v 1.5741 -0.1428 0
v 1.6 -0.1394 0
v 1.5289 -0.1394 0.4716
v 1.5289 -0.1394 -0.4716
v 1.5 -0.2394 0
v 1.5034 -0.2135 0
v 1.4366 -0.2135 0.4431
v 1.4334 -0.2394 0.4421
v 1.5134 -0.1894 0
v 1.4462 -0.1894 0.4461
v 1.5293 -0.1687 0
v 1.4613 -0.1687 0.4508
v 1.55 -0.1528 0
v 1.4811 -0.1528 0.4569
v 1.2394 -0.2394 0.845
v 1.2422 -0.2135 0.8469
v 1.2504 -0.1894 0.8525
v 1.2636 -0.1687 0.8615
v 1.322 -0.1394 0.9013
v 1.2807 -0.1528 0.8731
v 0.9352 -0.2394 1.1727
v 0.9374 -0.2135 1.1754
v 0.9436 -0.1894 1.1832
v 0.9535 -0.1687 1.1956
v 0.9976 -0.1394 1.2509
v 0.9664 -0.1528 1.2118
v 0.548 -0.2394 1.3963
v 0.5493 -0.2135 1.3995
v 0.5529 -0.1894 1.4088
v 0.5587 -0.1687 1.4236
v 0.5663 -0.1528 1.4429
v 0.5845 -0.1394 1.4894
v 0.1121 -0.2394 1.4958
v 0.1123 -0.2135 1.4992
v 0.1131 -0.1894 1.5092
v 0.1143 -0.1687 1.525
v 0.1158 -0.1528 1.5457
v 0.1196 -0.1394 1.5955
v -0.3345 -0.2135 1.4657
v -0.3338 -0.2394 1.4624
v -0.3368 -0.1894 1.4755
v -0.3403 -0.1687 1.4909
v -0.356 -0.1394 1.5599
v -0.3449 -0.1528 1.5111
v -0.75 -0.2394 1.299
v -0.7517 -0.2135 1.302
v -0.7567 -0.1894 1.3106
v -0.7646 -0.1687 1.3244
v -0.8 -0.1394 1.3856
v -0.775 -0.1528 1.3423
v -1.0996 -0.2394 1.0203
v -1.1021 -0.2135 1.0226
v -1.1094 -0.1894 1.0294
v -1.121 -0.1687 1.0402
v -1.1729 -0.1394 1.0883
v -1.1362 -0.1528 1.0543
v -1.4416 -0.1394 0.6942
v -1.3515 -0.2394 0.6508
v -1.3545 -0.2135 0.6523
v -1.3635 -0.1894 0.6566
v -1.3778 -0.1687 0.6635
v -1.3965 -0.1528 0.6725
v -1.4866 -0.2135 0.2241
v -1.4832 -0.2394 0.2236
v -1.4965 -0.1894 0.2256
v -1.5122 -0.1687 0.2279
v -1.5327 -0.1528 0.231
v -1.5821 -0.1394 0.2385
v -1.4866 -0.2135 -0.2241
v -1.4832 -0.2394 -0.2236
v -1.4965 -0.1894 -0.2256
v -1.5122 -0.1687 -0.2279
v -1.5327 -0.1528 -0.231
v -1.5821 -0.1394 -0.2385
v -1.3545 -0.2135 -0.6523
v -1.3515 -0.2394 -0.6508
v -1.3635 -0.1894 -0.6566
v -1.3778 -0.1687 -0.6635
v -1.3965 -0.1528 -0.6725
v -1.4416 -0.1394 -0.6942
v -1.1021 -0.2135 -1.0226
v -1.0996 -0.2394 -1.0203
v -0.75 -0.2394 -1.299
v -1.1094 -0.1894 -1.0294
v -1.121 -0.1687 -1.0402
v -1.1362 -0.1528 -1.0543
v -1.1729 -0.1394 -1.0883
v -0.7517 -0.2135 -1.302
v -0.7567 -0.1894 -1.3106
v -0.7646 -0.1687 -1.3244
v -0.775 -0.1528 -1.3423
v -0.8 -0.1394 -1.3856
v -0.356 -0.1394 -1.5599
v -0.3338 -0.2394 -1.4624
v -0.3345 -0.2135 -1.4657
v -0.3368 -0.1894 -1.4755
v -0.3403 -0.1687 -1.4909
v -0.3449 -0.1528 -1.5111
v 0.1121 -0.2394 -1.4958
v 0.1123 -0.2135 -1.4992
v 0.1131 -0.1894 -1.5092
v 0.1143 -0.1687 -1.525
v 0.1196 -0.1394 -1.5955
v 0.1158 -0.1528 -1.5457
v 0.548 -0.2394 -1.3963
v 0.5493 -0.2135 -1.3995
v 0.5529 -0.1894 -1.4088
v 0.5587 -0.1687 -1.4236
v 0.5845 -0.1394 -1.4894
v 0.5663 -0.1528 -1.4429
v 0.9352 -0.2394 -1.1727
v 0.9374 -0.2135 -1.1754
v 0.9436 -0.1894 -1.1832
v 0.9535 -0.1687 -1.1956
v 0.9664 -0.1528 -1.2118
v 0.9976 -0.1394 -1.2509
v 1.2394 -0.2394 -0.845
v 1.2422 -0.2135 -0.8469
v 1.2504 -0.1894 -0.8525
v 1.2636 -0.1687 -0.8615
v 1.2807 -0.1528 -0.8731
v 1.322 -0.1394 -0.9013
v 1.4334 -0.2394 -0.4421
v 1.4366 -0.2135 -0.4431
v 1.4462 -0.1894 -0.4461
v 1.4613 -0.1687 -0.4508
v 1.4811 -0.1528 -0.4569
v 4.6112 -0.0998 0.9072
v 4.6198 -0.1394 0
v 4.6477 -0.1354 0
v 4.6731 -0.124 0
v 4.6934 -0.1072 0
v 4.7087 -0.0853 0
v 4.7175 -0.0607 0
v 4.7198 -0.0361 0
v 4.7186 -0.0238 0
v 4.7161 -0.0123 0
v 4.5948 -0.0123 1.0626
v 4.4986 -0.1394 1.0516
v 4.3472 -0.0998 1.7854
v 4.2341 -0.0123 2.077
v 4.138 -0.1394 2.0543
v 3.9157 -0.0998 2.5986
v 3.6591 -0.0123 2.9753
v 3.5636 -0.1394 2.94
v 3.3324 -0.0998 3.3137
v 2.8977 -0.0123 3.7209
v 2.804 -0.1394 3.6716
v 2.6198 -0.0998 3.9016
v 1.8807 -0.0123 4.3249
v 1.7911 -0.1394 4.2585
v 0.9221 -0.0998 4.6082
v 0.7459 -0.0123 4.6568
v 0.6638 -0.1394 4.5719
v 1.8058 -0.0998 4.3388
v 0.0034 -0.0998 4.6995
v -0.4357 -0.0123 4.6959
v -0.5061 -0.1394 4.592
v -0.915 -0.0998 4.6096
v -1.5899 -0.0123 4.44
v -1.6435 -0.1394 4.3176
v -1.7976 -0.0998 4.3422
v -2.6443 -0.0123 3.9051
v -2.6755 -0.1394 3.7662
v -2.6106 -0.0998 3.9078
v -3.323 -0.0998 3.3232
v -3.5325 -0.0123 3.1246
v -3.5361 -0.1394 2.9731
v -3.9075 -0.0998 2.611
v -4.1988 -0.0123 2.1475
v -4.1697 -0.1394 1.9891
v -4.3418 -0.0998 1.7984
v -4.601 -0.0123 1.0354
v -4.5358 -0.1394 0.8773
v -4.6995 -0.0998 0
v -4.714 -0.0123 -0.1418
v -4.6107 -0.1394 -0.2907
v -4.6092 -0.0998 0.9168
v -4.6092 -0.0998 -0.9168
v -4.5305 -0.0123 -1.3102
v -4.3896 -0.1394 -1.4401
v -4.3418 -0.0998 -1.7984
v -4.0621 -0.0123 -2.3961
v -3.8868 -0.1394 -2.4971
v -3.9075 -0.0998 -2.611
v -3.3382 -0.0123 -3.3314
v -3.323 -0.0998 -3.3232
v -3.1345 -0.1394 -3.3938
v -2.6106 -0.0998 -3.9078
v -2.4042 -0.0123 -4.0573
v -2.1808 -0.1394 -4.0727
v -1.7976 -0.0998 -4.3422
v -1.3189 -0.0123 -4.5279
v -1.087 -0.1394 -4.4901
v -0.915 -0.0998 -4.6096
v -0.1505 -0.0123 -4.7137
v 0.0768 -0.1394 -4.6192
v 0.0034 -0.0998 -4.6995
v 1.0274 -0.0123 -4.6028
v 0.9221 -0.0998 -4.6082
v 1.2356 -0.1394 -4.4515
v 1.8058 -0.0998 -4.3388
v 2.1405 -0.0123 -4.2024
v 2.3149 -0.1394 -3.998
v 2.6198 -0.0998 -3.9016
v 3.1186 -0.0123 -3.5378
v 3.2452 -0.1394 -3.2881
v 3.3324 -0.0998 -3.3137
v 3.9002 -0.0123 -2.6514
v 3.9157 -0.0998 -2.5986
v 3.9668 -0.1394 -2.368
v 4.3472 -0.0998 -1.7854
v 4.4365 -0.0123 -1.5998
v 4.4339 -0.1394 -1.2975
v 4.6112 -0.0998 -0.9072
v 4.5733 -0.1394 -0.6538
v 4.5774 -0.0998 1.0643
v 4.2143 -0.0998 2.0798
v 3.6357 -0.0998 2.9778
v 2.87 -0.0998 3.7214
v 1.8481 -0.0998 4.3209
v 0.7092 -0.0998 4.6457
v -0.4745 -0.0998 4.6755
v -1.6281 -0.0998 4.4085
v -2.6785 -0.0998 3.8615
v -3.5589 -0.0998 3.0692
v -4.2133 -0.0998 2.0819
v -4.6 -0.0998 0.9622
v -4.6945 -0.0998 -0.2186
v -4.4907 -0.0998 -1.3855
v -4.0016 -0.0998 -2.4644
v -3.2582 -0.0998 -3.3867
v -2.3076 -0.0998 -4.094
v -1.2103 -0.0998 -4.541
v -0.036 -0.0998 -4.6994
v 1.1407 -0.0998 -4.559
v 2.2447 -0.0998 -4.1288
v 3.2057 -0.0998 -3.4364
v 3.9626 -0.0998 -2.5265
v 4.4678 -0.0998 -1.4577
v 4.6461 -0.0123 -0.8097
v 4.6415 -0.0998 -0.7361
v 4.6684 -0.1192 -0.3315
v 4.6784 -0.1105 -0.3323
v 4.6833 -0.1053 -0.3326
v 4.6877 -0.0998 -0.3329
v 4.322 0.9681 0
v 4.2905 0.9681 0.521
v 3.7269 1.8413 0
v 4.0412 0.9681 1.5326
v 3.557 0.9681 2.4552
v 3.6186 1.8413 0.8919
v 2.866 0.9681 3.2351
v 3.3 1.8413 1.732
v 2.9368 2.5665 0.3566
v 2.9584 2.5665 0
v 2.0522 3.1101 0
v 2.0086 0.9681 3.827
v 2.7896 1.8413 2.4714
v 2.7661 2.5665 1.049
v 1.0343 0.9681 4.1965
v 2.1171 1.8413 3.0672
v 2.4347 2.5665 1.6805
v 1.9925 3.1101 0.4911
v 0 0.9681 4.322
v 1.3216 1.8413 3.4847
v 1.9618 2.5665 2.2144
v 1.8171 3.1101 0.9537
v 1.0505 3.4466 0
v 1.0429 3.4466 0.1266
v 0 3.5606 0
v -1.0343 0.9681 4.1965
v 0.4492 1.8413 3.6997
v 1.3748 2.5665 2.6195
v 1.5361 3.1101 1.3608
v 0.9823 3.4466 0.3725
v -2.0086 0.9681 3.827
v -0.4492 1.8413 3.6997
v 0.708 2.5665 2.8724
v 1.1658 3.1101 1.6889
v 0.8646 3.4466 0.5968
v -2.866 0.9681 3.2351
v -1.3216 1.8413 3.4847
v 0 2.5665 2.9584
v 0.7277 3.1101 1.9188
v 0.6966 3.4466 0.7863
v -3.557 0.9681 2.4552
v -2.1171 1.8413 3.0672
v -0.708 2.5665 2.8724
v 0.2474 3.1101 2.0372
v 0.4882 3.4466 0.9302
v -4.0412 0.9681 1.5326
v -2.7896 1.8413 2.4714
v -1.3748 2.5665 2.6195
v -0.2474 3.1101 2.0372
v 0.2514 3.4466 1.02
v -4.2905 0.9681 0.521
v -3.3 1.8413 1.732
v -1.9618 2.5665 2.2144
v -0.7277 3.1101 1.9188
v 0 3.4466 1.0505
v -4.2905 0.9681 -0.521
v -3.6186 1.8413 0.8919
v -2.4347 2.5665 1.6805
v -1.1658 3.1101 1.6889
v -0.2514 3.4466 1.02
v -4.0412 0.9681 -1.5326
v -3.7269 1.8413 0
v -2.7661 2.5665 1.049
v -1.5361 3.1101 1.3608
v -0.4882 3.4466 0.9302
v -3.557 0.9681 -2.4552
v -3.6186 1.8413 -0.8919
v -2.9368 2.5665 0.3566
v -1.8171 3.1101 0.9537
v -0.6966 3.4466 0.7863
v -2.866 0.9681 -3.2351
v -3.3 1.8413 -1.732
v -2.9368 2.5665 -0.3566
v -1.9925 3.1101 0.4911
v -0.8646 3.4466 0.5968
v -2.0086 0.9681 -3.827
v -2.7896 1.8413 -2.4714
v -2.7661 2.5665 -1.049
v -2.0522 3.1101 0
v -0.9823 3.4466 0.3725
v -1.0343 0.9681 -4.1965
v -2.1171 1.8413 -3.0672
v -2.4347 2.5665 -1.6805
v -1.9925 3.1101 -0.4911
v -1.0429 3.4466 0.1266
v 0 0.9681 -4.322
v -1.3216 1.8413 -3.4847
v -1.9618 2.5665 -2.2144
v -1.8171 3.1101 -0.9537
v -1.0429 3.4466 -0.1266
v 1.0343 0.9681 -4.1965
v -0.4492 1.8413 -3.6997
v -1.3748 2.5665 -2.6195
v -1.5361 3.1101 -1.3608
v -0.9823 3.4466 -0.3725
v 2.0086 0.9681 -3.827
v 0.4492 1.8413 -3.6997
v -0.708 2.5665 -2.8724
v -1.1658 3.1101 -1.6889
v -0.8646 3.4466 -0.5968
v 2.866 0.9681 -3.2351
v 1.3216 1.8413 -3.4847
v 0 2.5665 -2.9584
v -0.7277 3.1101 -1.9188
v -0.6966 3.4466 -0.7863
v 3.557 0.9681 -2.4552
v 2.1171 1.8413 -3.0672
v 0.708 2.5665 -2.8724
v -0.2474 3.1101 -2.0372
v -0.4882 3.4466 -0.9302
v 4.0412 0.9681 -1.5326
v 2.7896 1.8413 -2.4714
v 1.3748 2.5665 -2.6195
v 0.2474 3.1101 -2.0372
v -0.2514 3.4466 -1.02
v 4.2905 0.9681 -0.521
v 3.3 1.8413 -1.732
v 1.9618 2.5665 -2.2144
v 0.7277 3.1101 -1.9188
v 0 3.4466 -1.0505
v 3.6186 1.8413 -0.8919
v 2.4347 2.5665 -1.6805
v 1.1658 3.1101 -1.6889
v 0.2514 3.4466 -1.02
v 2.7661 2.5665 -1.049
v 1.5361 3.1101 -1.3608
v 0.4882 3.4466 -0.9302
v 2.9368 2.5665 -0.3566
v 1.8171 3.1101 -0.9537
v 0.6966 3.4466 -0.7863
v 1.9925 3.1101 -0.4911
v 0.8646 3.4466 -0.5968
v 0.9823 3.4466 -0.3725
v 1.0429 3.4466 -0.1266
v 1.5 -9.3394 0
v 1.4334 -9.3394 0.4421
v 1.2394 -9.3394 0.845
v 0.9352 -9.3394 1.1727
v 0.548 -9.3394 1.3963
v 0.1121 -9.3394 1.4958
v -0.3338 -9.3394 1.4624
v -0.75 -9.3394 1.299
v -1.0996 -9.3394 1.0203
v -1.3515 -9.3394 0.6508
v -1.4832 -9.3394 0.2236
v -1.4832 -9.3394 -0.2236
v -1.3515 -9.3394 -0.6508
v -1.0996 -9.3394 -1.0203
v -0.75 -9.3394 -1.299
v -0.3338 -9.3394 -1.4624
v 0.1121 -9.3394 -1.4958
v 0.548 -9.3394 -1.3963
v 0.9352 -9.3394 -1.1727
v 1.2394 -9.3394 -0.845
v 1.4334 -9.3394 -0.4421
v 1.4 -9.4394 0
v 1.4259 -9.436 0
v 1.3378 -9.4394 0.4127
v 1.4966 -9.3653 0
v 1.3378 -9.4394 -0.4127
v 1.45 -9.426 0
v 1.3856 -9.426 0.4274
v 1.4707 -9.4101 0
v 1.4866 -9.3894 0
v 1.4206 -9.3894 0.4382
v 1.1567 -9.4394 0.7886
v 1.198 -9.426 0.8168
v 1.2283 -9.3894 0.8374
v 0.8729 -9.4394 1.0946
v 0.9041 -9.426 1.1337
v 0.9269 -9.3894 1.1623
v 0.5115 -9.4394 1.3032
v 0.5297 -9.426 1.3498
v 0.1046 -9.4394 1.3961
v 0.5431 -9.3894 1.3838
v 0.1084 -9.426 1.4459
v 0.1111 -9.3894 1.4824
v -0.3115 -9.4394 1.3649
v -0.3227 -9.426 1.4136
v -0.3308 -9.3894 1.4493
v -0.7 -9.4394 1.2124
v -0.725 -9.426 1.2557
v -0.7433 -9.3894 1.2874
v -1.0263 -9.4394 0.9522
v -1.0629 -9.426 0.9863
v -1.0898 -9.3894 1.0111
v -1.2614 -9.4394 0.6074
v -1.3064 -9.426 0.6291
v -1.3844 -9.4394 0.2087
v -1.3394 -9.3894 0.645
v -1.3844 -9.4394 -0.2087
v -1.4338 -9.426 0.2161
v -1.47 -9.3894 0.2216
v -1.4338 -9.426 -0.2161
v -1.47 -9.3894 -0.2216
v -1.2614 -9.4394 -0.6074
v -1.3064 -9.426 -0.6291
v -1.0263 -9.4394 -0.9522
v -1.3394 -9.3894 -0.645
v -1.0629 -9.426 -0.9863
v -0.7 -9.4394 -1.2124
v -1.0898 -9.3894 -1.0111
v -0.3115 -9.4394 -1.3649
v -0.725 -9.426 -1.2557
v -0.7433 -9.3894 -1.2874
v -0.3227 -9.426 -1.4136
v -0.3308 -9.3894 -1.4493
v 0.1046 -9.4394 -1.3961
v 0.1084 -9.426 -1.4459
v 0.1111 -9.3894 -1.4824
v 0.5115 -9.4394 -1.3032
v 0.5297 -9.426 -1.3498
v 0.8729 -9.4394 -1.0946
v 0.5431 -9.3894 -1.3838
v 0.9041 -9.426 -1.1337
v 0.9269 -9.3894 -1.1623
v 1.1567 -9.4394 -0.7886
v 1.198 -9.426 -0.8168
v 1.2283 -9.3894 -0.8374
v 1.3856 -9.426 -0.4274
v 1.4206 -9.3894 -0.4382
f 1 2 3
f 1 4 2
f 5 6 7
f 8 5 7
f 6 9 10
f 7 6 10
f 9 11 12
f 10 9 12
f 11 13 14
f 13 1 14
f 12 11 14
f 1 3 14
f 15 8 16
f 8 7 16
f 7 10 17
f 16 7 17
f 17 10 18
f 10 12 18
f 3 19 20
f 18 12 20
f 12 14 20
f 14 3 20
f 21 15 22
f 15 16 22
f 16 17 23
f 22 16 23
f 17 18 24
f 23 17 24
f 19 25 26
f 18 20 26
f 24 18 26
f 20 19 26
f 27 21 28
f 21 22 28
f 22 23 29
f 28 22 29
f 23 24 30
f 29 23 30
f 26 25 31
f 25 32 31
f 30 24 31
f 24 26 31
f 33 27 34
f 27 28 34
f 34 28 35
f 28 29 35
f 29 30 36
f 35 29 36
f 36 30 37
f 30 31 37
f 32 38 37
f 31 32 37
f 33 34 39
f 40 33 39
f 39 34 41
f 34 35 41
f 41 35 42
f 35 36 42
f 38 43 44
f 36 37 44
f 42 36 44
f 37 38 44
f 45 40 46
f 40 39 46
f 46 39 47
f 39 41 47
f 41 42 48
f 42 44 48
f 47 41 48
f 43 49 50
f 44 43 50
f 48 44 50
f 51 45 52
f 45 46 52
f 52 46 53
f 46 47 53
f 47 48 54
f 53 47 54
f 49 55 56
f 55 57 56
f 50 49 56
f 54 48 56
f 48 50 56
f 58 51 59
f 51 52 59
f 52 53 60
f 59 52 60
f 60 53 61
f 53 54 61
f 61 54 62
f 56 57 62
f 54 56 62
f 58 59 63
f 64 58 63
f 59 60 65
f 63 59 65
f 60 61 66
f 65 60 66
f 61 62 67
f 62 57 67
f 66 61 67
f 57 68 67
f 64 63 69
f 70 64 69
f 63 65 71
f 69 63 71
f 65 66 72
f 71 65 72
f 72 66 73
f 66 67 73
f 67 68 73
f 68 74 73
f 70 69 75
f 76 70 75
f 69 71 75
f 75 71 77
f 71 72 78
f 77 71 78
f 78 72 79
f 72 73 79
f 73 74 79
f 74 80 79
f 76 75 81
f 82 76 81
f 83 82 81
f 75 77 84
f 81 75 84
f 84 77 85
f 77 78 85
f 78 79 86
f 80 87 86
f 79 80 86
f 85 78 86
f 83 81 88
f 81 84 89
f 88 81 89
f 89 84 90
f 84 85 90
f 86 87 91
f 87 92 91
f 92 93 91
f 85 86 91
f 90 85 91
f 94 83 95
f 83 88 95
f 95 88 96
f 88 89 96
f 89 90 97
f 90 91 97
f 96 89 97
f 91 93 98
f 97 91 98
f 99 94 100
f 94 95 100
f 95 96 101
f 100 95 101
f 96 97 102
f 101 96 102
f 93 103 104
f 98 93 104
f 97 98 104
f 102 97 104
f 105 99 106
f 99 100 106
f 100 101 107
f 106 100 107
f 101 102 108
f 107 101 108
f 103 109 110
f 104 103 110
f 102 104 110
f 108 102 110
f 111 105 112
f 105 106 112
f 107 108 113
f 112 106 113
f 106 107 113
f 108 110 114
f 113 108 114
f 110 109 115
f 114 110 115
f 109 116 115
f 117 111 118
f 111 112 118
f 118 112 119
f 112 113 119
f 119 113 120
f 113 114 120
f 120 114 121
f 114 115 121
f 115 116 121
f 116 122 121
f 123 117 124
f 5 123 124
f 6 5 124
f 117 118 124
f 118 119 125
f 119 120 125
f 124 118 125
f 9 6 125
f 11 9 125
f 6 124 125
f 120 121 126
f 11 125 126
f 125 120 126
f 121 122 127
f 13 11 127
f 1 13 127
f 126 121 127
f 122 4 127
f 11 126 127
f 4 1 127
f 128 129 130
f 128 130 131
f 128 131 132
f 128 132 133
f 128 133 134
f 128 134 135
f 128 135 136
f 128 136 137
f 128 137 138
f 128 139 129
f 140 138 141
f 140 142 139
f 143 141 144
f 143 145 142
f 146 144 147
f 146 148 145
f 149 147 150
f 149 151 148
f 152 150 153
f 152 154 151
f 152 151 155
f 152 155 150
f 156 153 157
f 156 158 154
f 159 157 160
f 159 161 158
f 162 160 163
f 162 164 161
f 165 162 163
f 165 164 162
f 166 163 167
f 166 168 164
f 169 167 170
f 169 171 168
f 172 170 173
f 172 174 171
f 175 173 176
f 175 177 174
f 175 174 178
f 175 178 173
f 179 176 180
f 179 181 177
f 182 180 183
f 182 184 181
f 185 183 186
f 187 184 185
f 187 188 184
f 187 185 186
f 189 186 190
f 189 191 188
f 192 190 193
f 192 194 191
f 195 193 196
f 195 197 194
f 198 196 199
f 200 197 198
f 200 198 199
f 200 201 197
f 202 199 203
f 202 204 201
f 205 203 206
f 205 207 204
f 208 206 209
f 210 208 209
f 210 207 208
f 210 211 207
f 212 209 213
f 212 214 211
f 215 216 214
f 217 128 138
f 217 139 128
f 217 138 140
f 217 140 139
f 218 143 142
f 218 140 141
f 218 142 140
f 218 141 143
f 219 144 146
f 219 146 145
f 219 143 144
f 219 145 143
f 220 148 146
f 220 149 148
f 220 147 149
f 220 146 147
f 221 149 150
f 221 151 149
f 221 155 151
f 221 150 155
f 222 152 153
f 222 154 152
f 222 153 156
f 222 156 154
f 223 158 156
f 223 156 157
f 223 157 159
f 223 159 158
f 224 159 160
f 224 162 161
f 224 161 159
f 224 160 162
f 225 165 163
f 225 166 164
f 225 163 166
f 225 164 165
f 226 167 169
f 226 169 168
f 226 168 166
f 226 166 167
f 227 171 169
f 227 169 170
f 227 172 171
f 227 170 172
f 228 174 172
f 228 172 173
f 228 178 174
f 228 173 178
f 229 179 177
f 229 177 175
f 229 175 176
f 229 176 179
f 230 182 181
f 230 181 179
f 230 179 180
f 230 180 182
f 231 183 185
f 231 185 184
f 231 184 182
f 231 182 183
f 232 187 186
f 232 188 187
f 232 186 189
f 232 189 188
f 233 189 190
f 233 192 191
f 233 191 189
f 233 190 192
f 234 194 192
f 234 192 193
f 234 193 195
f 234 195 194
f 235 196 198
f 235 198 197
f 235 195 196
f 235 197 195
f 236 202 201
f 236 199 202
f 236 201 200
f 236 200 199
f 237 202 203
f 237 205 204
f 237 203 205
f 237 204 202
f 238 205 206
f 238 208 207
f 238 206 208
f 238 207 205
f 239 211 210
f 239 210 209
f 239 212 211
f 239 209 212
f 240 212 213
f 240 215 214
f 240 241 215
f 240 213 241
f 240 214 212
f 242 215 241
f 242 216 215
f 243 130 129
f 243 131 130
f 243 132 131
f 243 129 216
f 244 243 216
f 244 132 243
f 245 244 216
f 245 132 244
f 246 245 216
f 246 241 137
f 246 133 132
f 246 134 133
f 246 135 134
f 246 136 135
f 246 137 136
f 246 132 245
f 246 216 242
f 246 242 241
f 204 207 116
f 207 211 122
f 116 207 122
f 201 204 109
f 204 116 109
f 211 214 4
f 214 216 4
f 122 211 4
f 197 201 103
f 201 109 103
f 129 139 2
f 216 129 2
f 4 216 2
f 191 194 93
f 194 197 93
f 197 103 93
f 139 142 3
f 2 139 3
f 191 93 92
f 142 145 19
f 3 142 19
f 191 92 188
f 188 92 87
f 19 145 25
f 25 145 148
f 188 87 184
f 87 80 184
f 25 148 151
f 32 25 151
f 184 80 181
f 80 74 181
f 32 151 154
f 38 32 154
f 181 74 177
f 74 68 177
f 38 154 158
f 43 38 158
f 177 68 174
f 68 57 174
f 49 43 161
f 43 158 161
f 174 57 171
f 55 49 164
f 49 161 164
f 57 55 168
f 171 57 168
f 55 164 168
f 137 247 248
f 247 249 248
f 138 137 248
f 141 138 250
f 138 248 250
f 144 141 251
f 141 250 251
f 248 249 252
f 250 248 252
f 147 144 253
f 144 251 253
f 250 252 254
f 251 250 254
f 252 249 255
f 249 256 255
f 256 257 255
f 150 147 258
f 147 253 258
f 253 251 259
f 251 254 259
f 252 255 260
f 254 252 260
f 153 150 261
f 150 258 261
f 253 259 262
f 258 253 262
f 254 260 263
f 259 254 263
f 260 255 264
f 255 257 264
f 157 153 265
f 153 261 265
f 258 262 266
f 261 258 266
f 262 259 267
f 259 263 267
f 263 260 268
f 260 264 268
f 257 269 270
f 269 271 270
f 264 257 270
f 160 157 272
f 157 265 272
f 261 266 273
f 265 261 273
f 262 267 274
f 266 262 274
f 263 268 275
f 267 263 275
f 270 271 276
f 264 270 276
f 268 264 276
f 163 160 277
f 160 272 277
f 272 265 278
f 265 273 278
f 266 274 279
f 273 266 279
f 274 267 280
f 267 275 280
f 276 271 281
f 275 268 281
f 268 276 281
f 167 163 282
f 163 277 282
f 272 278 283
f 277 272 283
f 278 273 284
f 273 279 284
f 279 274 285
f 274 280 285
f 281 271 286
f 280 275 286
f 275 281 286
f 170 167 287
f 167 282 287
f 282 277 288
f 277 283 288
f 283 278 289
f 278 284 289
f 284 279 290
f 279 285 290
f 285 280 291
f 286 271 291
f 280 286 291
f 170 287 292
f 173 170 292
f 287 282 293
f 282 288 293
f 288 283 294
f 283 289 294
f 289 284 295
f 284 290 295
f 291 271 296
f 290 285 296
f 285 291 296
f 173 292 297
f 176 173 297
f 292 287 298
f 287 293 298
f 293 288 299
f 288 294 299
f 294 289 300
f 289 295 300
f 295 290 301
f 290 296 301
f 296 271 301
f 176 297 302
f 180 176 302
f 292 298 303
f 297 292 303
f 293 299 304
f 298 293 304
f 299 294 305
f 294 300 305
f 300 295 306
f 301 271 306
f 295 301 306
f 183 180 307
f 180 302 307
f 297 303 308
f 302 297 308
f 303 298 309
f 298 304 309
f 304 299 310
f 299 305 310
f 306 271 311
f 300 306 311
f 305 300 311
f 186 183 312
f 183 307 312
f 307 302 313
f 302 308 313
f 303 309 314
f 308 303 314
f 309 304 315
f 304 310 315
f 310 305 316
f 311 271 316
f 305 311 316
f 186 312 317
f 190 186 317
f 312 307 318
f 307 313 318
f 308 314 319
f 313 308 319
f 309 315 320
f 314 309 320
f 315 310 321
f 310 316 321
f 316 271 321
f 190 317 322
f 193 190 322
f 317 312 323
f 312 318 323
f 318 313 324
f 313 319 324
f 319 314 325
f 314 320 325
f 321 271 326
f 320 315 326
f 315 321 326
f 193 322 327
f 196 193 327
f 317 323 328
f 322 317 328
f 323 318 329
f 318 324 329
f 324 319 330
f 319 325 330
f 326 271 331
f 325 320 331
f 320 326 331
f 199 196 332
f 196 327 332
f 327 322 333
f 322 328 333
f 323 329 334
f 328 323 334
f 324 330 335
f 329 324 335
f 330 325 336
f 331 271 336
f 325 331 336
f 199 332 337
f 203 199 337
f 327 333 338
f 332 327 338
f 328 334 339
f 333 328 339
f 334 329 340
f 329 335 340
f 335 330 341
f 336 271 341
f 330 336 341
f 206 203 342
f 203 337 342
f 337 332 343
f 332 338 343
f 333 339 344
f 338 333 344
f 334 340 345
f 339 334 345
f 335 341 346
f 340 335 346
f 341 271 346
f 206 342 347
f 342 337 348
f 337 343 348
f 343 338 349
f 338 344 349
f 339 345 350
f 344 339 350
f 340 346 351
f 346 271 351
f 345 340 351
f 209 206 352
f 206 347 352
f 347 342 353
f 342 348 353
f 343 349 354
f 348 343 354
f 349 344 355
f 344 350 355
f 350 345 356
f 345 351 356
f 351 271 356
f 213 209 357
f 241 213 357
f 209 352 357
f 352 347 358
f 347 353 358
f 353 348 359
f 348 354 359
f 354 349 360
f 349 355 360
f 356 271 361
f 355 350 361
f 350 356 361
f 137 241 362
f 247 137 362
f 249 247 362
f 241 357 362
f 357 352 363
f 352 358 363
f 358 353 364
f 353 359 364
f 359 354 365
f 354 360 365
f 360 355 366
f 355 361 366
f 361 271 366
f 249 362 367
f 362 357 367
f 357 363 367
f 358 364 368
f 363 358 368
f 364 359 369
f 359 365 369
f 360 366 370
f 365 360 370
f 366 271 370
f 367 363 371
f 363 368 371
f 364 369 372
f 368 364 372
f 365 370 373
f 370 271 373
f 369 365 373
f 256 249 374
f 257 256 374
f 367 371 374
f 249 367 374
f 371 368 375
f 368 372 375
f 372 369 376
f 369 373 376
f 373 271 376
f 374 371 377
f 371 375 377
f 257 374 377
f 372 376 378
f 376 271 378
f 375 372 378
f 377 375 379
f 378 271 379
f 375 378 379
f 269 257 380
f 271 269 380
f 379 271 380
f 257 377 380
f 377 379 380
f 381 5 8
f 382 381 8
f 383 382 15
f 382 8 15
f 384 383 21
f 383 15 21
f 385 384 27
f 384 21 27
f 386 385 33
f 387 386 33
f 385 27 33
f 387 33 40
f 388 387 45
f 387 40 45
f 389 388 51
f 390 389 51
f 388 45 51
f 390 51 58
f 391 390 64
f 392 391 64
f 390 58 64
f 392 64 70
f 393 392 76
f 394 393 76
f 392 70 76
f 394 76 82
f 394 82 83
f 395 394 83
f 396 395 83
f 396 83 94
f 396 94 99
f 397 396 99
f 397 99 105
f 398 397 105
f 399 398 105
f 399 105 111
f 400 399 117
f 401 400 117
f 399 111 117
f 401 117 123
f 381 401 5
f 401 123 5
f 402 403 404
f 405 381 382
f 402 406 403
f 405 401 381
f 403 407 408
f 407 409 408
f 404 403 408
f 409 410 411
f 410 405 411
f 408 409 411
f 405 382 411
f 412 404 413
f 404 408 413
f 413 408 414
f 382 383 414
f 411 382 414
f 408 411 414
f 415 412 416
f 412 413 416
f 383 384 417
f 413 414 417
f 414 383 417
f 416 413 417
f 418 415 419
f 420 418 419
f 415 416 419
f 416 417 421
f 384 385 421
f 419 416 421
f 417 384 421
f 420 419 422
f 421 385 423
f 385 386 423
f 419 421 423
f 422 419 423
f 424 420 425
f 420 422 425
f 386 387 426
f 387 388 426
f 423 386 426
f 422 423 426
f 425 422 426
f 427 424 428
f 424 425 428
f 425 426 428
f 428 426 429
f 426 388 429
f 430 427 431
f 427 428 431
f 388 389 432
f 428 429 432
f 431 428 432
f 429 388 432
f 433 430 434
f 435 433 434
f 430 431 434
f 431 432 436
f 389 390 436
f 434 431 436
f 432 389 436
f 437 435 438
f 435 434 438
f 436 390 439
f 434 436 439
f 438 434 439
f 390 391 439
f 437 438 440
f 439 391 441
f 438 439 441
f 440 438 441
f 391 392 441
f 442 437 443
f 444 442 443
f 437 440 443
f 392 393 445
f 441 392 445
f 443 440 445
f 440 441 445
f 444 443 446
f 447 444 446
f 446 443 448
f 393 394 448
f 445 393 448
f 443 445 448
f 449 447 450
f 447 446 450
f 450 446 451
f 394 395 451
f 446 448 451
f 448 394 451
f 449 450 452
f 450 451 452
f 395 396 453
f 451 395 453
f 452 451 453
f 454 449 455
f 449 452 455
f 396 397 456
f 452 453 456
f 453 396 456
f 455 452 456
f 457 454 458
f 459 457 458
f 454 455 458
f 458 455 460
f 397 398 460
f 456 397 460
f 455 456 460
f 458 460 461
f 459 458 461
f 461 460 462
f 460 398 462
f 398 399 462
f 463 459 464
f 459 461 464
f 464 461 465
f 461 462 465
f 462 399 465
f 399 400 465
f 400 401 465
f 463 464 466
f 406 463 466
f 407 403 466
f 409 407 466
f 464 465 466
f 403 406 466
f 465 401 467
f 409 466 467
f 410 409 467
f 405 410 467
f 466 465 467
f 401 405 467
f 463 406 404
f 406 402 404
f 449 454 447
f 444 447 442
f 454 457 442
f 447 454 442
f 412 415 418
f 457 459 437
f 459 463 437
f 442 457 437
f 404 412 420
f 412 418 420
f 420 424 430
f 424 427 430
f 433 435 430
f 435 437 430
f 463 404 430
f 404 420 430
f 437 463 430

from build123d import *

# Parameters (mm, degrees)
FILLET2_R = 0.1


with BuildPart() as part:
    # Sketch1 → Revolve1 (revolve)
    with BuildSketch(Plane.XY):
        with BuildLine():
            Line((0, 3.560597848), (0, -9.439402152))
            Line((0, -9.439402152), (1.5, -9.439402152))
            Line((1.5, -9.439402152), (1.5, -0.139402152))
            Line((1.5, -0.139402152), (4.75, -0.139402152))
            ThreePointArc((4.75, -0.139402152), (3.01050245, 2.526445588), (0, 3.560597848))
        make_face()
    revolve(axis=Axis((0, 3.560597848, 0), (0, -1, 0)))

    # Fillet2
    fillet2_edges = [part.edges().sort_by_distance(p)[0] for p in [
        (-1.5, -9.439402152, 0),
        (-1.5, -0.139402152, 0),
        (-4.75, -0.139402152, 0),
    ]]
    fillet(fillet2_edges, radius=FILLET2_R)


solid = part.part
